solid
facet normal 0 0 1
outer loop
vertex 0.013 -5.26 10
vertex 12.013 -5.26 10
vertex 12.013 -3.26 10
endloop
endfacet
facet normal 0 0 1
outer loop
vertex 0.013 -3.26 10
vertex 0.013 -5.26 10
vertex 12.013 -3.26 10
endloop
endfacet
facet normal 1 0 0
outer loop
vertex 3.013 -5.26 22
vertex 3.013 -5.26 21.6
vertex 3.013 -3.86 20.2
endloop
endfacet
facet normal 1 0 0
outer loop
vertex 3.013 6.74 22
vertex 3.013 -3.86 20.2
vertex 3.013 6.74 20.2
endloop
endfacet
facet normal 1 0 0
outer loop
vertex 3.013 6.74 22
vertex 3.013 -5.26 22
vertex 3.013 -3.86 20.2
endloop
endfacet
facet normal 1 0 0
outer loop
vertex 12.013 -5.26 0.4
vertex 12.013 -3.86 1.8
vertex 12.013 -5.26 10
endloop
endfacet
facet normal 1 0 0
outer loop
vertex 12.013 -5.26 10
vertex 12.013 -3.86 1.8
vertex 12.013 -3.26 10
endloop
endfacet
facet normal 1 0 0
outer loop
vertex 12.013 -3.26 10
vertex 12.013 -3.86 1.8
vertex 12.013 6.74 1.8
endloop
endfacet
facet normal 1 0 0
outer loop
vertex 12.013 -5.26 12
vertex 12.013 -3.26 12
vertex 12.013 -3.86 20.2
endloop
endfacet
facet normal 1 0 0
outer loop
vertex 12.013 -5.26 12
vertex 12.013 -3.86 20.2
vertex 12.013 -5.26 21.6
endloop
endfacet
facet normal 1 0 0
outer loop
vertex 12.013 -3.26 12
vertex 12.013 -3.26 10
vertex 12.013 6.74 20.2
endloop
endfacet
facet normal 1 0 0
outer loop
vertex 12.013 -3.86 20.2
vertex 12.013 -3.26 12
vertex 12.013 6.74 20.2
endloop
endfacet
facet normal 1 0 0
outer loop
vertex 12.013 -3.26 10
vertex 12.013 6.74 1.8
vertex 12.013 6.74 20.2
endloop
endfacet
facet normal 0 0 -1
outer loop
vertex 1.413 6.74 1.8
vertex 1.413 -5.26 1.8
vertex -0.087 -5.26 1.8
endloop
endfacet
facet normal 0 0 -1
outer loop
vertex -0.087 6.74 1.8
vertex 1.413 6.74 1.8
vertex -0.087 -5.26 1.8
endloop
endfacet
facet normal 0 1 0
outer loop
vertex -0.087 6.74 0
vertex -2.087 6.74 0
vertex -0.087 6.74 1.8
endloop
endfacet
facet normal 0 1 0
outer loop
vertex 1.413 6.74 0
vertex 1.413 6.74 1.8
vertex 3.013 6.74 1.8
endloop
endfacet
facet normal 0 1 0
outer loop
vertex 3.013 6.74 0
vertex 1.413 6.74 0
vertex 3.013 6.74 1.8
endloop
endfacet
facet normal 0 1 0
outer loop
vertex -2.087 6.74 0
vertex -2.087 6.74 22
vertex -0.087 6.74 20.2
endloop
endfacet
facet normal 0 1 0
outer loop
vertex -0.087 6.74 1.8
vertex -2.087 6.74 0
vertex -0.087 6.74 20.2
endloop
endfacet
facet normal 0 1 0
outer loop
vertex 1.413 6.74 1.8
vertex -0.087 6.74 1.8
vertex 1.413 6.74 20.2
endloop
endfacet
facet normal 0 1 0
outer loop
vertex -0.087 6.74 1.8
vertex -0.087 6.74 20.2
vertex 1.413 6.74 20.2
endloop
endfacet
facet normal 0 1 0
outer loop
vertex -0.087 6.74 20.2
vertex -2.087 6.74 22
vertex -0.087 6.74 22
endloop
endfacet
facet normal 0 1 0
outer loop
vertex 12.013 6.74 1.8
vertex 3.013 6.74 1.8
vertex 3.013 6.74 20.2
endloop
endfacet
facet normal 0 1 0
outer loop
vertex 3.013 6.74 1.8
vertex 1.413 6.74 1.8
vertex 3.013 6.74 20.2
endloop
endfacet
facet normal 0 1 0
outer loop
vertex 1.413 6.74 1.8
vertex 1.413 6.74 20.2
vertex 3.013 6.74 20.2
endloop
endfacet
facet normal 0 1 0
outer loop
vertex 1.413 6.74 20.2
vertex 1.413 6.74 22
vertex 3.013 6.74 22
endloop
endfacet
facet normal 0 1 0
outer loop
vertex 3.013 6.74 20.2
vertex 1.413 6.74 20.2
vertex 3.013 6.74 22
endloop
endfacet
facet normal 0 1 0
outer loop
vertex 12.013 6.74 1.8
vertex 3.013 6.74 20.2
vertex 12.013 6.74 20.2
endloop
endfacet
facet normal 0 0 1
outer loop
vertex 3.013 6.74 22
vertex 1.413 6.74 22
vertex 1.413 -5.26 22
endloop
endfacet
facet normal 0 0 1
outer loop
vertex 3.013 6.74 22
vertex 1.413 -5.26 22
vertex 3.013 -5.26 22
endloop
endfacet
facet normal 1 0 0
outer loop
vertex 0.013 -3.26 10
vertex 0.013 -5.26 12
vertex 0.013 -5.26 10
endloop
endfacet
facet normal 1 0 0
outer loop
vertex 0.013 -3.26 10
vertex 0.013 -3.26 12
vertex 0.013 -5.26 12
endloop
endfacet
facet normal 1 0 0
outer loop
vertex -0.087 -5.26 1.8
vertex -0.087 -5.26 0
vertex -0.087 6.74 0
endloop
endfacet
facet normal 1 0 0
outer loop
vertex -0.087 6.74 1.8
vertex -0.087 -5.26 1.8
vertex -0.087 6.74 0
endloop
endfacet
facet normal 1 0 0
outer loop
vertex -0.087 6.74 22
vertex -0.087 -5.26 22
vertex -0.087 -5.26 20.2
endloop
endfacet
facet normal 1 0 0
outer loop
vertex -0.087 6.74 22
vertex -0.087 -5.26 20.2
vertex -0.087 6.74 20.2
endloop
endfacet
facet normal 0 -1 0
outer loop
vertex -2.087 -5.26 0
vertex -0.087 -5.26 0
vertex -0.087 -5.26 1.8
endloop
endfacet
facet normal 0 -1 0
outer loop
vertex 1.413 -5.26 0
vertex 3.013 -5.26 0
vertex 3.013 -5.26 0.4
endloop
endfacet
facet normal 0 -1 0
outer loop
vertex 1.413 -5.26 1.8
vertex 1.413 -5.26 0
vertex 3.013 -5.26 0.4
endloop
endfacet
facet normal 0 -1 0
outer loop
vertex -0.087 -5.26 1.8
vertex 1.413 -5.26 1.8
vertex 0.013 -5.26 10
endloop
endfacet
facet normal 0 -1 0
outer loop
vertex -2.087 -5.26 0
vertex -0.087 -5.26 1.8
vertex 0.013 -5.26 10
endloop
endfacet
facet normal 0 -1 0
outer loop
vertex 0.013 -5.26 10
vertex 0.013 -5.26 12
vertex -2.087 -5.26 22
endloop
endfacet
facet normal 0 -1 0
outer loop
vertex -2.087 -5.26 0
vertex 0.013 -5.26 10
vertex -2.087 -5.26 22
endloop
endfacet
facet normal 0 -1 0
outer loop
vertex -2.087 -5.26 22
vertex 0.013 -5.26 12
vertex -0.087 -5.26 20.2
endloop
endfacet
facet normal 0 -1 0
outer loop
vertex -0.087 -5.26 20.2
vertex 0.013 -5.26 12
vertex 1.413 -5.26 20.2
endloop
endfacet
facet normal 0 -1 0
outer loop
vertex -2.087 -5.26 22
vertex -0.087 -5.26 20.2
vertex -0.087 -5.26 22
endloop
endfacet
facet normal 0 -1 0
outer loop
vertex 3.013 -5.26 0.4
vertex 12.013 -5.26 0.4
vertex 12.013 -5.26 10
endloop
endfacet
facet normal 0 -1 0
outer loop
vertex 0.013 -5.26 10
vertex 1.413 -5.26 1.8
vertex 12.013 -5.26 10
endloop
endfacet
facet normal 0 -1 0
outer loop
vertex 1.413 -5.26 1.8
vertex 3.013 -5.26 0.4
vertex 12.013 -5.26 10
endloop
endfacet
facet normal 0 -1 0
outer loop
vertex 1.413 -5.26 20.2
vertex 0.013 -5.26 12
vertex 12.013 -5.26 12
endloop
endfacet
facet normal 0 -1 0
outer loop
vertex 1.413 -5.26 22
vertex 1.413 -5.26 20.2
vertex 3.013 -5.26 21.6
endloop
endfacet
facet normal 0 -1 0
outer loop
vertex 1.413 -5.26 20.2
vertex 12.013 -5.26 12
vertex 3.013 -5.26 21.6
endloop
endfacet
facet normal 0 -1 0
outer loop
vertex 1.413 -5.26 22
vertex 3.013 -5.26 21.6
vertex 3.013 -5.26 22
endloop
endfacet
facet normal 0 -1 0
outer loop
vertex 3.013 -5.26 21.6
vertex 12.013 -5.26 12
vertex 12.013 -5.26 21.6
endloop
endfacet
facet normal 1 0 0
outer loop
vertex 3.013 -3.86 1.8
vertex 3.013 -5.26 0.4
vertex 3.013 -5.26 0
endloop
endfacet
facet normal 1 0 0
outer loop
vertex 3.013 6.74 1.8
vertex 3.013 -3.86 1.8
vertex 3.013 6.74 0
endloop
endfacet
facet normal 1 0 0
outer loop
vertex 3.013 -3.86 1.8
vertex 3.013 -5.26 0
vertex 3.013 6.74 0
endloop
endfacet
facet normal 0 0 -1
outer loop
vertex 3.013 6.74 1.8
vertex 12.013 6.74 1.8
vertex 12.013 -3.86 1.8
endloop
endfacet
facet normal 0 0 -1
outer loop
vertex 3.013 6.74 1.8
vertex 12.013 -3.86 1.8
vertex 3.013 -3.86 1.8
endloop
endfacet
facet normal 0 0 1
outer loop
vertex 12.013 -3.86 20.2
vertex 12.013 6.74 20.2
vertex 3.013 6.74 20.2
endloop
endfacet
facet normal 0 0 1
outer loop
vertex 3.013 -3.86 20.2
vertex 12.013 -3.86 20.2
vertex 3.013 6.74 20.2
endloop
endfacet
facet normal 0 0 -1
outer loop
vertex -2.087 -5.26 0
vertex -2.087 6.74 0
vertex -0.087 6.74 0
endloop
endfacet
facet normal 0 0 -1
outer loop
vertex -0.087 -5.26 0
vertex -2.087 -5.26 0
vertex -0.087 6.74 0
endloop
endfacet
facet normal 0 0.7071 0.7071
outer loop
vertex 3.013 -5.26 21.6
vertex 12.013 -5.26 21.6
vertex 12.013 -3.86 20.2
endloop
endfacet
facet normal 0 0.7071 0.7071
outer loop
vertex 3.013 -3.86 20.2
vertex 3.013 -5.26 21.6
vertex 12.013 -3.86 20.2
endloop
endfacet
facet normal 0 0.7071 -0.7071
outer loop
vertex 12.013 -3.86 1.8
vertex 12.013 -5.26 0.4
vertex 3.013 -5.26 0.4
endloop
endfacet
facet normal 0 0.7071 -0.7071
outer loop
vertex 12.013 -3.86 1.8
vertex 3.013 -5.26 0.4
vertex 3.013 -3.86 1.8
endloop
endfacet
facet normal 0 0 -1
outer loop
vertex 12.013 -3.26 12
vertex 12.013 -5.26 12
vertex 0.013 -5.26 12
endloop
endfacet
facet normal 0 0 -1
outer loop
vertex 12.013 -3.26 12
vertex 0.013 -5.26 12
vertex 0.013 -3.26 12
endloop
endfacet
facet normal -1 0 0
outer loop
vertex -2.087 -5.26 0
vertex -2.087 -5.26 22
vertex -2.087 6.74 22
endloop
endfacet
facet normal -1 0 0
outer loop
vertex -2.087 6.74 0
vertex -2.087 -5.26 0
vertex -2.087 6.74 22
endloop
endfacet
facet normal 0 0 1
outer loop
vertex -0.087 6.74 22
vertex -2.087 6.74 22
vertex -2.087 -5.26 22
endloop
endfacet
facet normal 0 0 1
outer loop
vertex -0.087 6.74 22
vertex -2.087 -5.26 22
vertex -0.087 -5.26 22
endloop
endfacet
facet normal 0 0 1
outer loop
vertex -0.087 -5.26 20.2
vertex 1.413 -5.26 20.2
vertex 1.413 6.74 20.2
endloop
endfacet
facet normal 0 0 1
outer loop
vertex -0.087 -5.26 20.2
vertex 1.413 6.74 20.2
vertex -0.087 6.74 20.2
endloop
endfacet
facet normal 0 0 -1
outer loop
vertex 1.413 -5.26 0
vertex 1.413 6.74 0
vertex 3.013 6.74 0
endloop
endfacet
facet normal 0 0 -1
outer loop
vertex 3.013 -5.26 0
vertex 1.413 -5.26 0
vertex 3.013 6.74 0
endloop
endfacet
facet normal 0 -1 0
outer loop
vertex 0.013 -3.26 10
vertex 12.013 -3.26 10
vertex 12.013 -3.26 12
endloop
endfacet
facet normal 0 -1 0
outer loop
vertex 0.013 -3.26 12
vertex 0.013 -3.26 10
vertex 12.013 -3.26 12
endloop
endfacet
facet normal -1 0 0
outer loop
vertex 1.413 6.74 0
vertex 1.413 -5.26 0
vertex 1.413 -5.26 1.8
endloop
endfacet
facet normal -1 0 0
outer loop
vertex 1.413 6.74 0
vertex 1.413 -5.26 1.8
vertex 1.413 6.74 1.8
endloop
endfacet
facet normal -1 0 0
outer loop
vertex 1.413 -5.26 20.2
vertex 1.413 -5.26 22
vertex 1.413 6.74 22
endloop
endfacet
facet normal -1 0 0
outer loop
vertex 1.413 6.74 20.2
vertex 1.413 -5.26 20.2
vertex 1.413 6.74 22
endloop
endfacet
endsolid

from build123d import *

# Parameters (mm, degrees)
SKETCH_1_W          = 14.1
SKETCH_1_H          = 12
EXTRUDE_1_DEPTH     = 11
SKETCH_2_W          = 1.5
SKETCH_2_H          = 12
CUT_EXTRUDE_1_DEPTH = 1.8
SKETCH_3_W          = 9
SKETCH_3_H          = 12
CUT_EXTRUDE_2_DEPTH = 1.8
EXTRUDE_2_DEPTH     = 9
SKETCH_5_W          = 1
SKETCH_5_H          = 2
CUT_EXTRUDE_3_DEPTH = 12


with BuildPart() as part:
    # Эскиз1 → Бобышка-Вытянуть1 (new body)
    with BuildSketch(Plane.XY):
        with Locations((4.962698413, 0.73968254)):
            Rectangle(SKETCH_1_W, SKETCH_1_H)
    extrude_1 = extrude(amount=EXTRUDE_1_DEPTH)

    # Эскиз2 → Вырез-Вытянуть1 (cut)
    with BuildSketch(Plane(origin=(0, 0, 0), x_dir=(-1, 0, 0), z_dir=(0, 0, -1))):
        with Locations((-0.662698413, 0.73968254)):
            Rectangle(SKETCH_2_W, SKETCH_2_H)
    cut_extrude_1 = extrude(amount=-CUT_EXTRUDE_1_DEPTH, mode=Mode.SUBTRACT)

    # Эскиз3 → Вырез-Вытянуть2 (cut)
    with BuildSketch(Plane(origin=(0, 0, 0), x_dir=(-1, 0, 0), z_dir=(0, 0, -1))):
        with Locations((-7.512698413, 0.73968254)):
            Rectangle(SKETCH_3_W, SKETCH_3_H)
    cut_extrude_2 = extrude(amount=-CUT_EXTRUDE_2_DEPTH, mode=Mode.SUBTRACT)

    # Эскиз4 → Бобышка-Вытянуть2 (add)
    with BuildSketch(Plane(origin=(12.012698413, 0, 0), x_dir=(0, 0, -1), z_dir=(1, 0, 0))):
        Polygon((-1.8, -5.26031746), (-0.4, -5.26031746), (-1.8, -3.86031746), align=None)
    extrude_2 = extrude(amount=-EXTRUDE_2_DEPTH)

    # Эскиз5 → Вырез-Вытянуть3 (cut)
    with BuildSketch(Plane(origin=(12.012698413, 0, 0), x_dir=(0, 0, -1), z_dir=(1, 0, 0))):
        with Locations((-10.5, -4.26031746)):
            Rectangle(SKETCH_5_W, SKETCH_5_H)
    cut_extrude_3 = extrude(amount=-CUT_EXTRUDE_3_DEPTH, mode=Mode.SUBTRACT)

    # Зеркальное отражение1: Бобышка-Вытянуть1, Вырез-Вытянуть1, Вырез-Вытянуть2, Бобышка-Вытянуть2, Вырез-Вытянуть3 across plane
    add(extrude_1.mirror(Plane.XY.offset(11)))
    add(cut_extrude_1.mirror(Plane.XY.offset(11)), mode=Mode.SUBTRACT)
    add(cut_extrude_2.mirror(Plane.XY.offset(11)), mode=Mode.SUBTRACT)
    add(extrude_2.mirror(Plane.XY.offset(11)))
    add(cut_extrude_3.mirror(Plane.XY.offset(11)), mode=Mode.SUBTRACT)


solid = part.part
